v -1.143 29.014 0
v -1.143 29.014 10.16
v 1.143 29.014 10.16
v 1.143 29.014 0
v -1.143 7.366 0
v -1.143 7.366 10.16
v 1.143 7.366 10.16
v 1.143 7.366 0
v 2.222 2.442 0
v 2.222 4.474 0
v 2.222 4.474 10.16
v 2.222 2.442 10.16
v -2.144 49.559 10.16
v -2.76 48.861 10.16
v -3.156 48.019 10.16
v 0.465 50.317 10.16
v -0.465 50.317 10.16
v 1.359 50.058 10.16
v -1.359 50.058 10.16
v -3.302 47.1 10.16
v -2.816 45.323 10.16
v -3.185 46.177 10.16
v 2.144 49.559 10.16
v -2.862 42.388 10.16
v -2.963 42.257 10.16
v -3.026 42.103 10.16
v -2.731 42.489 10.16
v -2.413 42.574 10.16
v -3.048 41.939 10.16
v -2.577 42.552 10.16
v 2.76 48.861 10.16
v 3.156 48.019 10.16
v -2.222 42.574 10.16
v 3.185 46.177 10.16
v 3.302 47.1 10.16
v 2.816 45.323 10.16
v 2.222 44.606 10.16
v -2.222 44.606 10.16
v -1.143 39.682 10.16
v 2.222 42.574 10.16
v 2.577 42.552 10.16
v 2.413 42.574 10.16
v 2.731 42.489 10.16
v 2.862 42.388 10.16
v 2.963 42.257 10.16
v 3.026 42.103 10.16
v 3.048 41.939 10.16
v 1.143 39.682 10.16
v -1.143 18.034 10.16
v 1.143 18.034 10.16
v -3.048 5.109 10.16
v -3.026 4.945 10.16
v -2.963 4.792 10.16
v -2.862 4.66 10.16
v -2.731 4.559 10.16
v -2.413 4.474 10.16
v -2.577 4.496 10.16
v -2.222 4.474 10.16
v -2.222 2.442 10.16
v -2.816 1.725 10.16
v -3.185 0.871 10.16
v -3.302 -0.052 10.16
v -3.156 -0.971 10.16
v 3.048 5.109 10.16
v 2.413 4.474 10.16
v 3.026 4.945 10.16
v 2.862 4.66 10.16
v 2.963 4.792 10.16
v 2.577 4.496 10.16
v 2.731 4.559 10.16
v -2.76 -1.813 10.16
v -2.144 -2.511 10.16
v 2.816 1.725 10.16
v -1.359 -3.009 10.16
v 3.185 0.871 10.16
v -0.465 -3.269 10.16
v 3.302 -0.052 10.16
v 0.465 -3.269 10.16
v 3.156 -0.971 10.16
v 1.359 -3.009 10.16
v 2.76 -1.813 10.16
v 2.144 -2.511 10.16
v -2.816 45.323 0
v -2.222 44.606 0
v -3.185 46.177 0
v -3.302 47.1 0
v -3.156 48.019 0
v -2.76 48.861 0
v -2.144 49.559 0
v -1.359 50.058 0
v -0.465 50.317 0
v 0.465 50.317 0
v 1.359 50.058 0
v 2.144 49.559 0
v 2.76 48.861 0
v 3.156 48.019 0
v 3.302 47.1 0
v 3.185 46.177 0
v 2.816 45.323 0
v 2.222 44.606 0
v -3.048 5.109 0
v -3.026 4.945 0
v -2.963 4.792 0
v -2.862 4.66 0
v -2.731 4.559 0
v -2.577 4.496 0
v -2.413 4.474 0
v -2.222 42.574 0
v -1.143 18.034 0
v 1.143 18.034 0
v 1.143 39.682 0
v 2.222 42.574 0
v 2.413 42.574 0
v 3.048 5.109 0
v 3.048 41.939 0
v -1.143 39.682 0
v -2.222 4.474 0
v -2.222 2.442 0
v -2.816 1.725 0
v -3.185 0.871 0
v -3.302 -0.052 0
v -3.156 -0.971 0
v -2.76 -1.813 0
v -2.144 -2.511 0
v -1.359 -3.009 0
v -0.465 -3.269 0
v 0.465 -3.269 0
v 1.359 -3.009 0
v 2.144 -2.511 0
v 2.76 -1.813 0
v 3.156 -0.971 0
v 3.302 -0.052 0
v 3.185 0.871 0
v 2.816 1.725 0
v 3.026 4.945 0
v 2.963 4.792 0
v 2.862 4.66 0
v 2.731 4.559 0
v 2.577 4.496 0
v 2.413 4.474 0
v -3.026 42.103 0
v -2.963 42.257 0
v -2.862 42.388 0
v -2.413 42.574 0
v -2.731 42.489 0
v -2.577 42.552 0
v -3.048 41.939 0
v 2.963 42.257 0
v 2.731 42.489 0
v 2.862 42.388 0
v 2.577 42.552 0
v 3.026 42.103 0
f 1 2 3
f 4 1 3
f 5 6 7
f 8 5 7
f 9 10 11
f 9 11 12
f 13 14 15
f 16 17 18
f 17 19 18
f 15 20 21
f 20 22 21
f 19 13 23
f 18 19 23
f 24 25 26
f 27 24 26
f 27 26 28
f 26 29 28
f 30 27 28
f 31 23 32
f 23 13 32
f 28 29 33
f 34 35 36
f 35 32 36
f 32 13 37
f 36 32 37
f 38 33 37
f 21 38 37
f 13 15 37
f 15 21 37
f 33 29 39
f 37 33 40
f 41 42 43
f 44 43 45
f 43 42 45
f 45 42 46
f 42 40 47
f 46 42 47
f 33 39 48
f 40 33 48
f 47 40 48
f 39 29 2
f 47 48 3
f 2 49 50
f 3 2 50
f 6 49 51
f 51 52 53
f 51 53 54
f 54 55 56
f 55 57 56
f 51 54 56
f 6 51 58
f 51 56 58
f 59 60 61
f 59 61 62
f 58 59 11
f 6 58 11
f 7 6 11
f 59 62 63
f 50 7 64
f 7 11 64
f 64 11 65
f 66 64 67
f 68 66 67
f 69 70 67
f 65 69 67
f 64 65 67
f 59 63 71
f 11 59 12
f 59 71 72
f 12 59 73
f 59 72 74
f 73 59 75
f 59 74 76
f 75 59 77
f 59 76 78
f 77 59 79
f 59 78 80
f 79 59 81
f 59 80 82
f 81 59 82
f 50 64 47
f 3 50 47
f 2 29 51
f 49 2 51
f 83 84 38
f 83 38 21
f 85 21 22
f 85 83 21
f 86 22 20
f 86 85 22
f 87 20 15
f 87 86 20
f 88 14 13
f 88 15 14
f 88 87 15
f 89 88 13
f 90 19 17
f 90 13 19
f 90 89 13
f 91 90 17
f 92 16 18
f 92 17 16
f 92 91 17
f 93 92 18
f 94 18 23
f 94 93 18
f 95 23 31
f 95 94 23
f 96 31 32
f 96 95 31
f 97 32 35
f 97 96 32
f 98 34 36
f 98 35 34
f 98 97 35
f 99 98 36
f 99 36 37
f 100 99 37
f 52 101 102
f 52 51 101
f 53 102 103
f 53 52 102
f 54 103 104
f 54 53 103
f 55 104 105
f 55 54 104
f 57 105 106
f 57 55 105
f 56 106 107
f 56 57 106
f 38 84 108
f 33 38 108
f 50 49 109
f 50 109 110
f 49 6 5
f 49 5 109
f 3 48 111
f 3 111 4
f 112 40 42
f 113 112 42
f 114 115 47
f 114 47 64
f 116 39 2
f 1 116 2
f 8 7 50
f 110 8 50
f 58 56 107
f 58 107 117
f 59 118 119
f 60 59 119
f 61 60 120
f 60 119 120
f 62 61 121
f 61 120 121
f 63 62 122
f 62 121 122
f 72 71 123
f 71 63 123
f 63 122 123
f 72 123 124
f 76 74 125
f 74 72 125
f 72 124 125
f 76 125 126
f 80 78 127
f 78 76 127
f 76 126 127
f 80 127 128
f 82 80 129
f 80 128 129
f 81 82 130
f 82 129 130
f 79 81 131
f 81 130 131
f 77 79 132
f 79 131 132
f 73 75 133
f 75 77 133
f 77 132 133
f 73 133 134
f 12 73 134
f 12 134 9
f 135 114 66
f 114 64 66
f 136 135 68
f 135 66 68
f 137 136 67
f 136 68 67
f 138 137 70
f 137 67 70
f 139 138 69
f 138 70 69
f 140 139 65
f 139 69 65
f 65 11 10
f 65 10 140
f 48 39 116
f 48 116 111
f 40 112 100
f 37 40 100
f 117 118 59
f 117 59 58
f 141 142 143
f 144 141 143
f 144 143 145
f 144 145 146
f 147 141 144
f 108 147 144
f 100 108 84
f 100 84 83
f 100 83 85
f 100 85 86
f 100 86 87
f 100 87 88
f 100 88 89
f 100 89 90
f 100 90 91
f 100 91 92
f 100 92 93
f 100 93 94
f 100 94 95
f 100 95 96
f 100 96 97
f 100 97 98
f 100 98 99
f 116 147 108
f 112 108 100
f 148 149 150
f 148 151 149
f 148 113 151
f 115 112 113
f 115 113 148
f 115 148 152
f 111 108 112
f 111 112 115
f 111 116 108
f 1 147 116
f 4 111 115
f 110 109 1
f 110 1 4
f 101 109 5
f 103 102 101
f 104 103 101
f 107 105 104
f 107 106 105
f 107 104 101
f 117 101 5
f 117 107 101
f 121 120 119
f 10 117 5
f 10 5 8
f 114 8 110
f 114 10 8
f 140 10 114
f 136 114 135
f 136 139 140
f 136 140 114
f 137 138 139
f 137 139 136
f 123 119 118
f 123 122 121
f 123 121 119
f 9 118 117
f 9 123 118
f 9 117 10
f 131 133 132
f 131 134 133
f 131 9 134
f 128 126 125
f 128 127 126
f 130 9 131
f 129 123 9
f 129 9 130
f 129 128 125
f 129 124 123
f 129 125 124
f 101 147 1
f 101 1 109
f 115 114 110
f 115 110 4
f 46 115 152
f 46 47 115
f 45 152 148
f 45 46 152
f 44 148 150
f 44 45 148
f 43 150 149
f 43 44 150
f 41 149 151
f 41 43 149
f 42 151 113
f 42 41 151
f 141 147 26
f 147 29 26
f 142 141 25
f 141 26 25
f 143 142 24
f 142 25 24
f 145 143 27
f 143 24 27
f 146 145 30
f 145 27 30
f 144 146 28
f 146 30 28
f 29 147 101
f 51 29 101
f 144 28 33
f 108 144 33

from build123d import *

# Parameters (mm, degrees)
F0_R     = 3.302
F1_DEPTH = 10.16
F3_DEPTH = 10.16
F4_W     = 6.096
F4_H     = 19.05
F5_DEPTH = 10.16
F6_R     = 0.635
F7_W     = 2.286
F7_H     = 10.668
F8_DEPTH = 25.4


with BuildPart() as f1:
    # F0 (on Top) → F1 (new body)
    with BuildSketch(Plane.XY):
        Circle(F0_R)
    extrude(amount=F1_DEPTH)

    # F2 (on face) → F3 (join, through all)
    with BuildSketch(Plane(origin=(0, 0, 0), x_dir=(1, 0, 0), z_dir=(0, 0, -1))):
        with BuildLine():
            ThreePointArc((2.2225, -2.442068), (0, -3.302), (-2.2225, -2.442068))
            Line((-2.2225, -2.442068), (-2.2225, -4.474068))
            Line((-2.2225, -4.474068), (2.2225, -4.474068))
            Line((2.2225, -4.474068), (2.2225, -2.442068))
        make_face()
    extrude(amount=-F3_DEPTH)

    # F4 (on Top) → F5 (join, through all)
    with BuildSketch(Plane.XY):
        with Locations((0, 13.999068)):
            Rectangle(F4_W, F4_H)
    extrude(amount=F5_DEPTH)

    # F6
    f6_edges = [f1.edges().sort_by_distance(p)[0] for p in [
        (3.048, 4.474068, 5.08),
        (-3.048, 4.474068, 5.08),
    ]]
    fillet(f6_edges, radius=F6_R)

    # F7 (on face) → F8 (cut)
    with BuildSketch(Plane.XY.offset(10.16)):
        with Locations((0, 12.7)):
            Rectangle(F7_W, F7_H)
    extrude(amount=-F8_DEPTH, mode=Mode.SUBTRACT)

    # F9: F1 across face


with BuildPart() as f1_1:
    add(f1.part)
    add(f1.part.mirror(Plane(origin=(0, 23.524068, 5.08), x_dir=(-1, 0, 0), z_dir=(0, 1, 0))))


solid = f1_1.part
